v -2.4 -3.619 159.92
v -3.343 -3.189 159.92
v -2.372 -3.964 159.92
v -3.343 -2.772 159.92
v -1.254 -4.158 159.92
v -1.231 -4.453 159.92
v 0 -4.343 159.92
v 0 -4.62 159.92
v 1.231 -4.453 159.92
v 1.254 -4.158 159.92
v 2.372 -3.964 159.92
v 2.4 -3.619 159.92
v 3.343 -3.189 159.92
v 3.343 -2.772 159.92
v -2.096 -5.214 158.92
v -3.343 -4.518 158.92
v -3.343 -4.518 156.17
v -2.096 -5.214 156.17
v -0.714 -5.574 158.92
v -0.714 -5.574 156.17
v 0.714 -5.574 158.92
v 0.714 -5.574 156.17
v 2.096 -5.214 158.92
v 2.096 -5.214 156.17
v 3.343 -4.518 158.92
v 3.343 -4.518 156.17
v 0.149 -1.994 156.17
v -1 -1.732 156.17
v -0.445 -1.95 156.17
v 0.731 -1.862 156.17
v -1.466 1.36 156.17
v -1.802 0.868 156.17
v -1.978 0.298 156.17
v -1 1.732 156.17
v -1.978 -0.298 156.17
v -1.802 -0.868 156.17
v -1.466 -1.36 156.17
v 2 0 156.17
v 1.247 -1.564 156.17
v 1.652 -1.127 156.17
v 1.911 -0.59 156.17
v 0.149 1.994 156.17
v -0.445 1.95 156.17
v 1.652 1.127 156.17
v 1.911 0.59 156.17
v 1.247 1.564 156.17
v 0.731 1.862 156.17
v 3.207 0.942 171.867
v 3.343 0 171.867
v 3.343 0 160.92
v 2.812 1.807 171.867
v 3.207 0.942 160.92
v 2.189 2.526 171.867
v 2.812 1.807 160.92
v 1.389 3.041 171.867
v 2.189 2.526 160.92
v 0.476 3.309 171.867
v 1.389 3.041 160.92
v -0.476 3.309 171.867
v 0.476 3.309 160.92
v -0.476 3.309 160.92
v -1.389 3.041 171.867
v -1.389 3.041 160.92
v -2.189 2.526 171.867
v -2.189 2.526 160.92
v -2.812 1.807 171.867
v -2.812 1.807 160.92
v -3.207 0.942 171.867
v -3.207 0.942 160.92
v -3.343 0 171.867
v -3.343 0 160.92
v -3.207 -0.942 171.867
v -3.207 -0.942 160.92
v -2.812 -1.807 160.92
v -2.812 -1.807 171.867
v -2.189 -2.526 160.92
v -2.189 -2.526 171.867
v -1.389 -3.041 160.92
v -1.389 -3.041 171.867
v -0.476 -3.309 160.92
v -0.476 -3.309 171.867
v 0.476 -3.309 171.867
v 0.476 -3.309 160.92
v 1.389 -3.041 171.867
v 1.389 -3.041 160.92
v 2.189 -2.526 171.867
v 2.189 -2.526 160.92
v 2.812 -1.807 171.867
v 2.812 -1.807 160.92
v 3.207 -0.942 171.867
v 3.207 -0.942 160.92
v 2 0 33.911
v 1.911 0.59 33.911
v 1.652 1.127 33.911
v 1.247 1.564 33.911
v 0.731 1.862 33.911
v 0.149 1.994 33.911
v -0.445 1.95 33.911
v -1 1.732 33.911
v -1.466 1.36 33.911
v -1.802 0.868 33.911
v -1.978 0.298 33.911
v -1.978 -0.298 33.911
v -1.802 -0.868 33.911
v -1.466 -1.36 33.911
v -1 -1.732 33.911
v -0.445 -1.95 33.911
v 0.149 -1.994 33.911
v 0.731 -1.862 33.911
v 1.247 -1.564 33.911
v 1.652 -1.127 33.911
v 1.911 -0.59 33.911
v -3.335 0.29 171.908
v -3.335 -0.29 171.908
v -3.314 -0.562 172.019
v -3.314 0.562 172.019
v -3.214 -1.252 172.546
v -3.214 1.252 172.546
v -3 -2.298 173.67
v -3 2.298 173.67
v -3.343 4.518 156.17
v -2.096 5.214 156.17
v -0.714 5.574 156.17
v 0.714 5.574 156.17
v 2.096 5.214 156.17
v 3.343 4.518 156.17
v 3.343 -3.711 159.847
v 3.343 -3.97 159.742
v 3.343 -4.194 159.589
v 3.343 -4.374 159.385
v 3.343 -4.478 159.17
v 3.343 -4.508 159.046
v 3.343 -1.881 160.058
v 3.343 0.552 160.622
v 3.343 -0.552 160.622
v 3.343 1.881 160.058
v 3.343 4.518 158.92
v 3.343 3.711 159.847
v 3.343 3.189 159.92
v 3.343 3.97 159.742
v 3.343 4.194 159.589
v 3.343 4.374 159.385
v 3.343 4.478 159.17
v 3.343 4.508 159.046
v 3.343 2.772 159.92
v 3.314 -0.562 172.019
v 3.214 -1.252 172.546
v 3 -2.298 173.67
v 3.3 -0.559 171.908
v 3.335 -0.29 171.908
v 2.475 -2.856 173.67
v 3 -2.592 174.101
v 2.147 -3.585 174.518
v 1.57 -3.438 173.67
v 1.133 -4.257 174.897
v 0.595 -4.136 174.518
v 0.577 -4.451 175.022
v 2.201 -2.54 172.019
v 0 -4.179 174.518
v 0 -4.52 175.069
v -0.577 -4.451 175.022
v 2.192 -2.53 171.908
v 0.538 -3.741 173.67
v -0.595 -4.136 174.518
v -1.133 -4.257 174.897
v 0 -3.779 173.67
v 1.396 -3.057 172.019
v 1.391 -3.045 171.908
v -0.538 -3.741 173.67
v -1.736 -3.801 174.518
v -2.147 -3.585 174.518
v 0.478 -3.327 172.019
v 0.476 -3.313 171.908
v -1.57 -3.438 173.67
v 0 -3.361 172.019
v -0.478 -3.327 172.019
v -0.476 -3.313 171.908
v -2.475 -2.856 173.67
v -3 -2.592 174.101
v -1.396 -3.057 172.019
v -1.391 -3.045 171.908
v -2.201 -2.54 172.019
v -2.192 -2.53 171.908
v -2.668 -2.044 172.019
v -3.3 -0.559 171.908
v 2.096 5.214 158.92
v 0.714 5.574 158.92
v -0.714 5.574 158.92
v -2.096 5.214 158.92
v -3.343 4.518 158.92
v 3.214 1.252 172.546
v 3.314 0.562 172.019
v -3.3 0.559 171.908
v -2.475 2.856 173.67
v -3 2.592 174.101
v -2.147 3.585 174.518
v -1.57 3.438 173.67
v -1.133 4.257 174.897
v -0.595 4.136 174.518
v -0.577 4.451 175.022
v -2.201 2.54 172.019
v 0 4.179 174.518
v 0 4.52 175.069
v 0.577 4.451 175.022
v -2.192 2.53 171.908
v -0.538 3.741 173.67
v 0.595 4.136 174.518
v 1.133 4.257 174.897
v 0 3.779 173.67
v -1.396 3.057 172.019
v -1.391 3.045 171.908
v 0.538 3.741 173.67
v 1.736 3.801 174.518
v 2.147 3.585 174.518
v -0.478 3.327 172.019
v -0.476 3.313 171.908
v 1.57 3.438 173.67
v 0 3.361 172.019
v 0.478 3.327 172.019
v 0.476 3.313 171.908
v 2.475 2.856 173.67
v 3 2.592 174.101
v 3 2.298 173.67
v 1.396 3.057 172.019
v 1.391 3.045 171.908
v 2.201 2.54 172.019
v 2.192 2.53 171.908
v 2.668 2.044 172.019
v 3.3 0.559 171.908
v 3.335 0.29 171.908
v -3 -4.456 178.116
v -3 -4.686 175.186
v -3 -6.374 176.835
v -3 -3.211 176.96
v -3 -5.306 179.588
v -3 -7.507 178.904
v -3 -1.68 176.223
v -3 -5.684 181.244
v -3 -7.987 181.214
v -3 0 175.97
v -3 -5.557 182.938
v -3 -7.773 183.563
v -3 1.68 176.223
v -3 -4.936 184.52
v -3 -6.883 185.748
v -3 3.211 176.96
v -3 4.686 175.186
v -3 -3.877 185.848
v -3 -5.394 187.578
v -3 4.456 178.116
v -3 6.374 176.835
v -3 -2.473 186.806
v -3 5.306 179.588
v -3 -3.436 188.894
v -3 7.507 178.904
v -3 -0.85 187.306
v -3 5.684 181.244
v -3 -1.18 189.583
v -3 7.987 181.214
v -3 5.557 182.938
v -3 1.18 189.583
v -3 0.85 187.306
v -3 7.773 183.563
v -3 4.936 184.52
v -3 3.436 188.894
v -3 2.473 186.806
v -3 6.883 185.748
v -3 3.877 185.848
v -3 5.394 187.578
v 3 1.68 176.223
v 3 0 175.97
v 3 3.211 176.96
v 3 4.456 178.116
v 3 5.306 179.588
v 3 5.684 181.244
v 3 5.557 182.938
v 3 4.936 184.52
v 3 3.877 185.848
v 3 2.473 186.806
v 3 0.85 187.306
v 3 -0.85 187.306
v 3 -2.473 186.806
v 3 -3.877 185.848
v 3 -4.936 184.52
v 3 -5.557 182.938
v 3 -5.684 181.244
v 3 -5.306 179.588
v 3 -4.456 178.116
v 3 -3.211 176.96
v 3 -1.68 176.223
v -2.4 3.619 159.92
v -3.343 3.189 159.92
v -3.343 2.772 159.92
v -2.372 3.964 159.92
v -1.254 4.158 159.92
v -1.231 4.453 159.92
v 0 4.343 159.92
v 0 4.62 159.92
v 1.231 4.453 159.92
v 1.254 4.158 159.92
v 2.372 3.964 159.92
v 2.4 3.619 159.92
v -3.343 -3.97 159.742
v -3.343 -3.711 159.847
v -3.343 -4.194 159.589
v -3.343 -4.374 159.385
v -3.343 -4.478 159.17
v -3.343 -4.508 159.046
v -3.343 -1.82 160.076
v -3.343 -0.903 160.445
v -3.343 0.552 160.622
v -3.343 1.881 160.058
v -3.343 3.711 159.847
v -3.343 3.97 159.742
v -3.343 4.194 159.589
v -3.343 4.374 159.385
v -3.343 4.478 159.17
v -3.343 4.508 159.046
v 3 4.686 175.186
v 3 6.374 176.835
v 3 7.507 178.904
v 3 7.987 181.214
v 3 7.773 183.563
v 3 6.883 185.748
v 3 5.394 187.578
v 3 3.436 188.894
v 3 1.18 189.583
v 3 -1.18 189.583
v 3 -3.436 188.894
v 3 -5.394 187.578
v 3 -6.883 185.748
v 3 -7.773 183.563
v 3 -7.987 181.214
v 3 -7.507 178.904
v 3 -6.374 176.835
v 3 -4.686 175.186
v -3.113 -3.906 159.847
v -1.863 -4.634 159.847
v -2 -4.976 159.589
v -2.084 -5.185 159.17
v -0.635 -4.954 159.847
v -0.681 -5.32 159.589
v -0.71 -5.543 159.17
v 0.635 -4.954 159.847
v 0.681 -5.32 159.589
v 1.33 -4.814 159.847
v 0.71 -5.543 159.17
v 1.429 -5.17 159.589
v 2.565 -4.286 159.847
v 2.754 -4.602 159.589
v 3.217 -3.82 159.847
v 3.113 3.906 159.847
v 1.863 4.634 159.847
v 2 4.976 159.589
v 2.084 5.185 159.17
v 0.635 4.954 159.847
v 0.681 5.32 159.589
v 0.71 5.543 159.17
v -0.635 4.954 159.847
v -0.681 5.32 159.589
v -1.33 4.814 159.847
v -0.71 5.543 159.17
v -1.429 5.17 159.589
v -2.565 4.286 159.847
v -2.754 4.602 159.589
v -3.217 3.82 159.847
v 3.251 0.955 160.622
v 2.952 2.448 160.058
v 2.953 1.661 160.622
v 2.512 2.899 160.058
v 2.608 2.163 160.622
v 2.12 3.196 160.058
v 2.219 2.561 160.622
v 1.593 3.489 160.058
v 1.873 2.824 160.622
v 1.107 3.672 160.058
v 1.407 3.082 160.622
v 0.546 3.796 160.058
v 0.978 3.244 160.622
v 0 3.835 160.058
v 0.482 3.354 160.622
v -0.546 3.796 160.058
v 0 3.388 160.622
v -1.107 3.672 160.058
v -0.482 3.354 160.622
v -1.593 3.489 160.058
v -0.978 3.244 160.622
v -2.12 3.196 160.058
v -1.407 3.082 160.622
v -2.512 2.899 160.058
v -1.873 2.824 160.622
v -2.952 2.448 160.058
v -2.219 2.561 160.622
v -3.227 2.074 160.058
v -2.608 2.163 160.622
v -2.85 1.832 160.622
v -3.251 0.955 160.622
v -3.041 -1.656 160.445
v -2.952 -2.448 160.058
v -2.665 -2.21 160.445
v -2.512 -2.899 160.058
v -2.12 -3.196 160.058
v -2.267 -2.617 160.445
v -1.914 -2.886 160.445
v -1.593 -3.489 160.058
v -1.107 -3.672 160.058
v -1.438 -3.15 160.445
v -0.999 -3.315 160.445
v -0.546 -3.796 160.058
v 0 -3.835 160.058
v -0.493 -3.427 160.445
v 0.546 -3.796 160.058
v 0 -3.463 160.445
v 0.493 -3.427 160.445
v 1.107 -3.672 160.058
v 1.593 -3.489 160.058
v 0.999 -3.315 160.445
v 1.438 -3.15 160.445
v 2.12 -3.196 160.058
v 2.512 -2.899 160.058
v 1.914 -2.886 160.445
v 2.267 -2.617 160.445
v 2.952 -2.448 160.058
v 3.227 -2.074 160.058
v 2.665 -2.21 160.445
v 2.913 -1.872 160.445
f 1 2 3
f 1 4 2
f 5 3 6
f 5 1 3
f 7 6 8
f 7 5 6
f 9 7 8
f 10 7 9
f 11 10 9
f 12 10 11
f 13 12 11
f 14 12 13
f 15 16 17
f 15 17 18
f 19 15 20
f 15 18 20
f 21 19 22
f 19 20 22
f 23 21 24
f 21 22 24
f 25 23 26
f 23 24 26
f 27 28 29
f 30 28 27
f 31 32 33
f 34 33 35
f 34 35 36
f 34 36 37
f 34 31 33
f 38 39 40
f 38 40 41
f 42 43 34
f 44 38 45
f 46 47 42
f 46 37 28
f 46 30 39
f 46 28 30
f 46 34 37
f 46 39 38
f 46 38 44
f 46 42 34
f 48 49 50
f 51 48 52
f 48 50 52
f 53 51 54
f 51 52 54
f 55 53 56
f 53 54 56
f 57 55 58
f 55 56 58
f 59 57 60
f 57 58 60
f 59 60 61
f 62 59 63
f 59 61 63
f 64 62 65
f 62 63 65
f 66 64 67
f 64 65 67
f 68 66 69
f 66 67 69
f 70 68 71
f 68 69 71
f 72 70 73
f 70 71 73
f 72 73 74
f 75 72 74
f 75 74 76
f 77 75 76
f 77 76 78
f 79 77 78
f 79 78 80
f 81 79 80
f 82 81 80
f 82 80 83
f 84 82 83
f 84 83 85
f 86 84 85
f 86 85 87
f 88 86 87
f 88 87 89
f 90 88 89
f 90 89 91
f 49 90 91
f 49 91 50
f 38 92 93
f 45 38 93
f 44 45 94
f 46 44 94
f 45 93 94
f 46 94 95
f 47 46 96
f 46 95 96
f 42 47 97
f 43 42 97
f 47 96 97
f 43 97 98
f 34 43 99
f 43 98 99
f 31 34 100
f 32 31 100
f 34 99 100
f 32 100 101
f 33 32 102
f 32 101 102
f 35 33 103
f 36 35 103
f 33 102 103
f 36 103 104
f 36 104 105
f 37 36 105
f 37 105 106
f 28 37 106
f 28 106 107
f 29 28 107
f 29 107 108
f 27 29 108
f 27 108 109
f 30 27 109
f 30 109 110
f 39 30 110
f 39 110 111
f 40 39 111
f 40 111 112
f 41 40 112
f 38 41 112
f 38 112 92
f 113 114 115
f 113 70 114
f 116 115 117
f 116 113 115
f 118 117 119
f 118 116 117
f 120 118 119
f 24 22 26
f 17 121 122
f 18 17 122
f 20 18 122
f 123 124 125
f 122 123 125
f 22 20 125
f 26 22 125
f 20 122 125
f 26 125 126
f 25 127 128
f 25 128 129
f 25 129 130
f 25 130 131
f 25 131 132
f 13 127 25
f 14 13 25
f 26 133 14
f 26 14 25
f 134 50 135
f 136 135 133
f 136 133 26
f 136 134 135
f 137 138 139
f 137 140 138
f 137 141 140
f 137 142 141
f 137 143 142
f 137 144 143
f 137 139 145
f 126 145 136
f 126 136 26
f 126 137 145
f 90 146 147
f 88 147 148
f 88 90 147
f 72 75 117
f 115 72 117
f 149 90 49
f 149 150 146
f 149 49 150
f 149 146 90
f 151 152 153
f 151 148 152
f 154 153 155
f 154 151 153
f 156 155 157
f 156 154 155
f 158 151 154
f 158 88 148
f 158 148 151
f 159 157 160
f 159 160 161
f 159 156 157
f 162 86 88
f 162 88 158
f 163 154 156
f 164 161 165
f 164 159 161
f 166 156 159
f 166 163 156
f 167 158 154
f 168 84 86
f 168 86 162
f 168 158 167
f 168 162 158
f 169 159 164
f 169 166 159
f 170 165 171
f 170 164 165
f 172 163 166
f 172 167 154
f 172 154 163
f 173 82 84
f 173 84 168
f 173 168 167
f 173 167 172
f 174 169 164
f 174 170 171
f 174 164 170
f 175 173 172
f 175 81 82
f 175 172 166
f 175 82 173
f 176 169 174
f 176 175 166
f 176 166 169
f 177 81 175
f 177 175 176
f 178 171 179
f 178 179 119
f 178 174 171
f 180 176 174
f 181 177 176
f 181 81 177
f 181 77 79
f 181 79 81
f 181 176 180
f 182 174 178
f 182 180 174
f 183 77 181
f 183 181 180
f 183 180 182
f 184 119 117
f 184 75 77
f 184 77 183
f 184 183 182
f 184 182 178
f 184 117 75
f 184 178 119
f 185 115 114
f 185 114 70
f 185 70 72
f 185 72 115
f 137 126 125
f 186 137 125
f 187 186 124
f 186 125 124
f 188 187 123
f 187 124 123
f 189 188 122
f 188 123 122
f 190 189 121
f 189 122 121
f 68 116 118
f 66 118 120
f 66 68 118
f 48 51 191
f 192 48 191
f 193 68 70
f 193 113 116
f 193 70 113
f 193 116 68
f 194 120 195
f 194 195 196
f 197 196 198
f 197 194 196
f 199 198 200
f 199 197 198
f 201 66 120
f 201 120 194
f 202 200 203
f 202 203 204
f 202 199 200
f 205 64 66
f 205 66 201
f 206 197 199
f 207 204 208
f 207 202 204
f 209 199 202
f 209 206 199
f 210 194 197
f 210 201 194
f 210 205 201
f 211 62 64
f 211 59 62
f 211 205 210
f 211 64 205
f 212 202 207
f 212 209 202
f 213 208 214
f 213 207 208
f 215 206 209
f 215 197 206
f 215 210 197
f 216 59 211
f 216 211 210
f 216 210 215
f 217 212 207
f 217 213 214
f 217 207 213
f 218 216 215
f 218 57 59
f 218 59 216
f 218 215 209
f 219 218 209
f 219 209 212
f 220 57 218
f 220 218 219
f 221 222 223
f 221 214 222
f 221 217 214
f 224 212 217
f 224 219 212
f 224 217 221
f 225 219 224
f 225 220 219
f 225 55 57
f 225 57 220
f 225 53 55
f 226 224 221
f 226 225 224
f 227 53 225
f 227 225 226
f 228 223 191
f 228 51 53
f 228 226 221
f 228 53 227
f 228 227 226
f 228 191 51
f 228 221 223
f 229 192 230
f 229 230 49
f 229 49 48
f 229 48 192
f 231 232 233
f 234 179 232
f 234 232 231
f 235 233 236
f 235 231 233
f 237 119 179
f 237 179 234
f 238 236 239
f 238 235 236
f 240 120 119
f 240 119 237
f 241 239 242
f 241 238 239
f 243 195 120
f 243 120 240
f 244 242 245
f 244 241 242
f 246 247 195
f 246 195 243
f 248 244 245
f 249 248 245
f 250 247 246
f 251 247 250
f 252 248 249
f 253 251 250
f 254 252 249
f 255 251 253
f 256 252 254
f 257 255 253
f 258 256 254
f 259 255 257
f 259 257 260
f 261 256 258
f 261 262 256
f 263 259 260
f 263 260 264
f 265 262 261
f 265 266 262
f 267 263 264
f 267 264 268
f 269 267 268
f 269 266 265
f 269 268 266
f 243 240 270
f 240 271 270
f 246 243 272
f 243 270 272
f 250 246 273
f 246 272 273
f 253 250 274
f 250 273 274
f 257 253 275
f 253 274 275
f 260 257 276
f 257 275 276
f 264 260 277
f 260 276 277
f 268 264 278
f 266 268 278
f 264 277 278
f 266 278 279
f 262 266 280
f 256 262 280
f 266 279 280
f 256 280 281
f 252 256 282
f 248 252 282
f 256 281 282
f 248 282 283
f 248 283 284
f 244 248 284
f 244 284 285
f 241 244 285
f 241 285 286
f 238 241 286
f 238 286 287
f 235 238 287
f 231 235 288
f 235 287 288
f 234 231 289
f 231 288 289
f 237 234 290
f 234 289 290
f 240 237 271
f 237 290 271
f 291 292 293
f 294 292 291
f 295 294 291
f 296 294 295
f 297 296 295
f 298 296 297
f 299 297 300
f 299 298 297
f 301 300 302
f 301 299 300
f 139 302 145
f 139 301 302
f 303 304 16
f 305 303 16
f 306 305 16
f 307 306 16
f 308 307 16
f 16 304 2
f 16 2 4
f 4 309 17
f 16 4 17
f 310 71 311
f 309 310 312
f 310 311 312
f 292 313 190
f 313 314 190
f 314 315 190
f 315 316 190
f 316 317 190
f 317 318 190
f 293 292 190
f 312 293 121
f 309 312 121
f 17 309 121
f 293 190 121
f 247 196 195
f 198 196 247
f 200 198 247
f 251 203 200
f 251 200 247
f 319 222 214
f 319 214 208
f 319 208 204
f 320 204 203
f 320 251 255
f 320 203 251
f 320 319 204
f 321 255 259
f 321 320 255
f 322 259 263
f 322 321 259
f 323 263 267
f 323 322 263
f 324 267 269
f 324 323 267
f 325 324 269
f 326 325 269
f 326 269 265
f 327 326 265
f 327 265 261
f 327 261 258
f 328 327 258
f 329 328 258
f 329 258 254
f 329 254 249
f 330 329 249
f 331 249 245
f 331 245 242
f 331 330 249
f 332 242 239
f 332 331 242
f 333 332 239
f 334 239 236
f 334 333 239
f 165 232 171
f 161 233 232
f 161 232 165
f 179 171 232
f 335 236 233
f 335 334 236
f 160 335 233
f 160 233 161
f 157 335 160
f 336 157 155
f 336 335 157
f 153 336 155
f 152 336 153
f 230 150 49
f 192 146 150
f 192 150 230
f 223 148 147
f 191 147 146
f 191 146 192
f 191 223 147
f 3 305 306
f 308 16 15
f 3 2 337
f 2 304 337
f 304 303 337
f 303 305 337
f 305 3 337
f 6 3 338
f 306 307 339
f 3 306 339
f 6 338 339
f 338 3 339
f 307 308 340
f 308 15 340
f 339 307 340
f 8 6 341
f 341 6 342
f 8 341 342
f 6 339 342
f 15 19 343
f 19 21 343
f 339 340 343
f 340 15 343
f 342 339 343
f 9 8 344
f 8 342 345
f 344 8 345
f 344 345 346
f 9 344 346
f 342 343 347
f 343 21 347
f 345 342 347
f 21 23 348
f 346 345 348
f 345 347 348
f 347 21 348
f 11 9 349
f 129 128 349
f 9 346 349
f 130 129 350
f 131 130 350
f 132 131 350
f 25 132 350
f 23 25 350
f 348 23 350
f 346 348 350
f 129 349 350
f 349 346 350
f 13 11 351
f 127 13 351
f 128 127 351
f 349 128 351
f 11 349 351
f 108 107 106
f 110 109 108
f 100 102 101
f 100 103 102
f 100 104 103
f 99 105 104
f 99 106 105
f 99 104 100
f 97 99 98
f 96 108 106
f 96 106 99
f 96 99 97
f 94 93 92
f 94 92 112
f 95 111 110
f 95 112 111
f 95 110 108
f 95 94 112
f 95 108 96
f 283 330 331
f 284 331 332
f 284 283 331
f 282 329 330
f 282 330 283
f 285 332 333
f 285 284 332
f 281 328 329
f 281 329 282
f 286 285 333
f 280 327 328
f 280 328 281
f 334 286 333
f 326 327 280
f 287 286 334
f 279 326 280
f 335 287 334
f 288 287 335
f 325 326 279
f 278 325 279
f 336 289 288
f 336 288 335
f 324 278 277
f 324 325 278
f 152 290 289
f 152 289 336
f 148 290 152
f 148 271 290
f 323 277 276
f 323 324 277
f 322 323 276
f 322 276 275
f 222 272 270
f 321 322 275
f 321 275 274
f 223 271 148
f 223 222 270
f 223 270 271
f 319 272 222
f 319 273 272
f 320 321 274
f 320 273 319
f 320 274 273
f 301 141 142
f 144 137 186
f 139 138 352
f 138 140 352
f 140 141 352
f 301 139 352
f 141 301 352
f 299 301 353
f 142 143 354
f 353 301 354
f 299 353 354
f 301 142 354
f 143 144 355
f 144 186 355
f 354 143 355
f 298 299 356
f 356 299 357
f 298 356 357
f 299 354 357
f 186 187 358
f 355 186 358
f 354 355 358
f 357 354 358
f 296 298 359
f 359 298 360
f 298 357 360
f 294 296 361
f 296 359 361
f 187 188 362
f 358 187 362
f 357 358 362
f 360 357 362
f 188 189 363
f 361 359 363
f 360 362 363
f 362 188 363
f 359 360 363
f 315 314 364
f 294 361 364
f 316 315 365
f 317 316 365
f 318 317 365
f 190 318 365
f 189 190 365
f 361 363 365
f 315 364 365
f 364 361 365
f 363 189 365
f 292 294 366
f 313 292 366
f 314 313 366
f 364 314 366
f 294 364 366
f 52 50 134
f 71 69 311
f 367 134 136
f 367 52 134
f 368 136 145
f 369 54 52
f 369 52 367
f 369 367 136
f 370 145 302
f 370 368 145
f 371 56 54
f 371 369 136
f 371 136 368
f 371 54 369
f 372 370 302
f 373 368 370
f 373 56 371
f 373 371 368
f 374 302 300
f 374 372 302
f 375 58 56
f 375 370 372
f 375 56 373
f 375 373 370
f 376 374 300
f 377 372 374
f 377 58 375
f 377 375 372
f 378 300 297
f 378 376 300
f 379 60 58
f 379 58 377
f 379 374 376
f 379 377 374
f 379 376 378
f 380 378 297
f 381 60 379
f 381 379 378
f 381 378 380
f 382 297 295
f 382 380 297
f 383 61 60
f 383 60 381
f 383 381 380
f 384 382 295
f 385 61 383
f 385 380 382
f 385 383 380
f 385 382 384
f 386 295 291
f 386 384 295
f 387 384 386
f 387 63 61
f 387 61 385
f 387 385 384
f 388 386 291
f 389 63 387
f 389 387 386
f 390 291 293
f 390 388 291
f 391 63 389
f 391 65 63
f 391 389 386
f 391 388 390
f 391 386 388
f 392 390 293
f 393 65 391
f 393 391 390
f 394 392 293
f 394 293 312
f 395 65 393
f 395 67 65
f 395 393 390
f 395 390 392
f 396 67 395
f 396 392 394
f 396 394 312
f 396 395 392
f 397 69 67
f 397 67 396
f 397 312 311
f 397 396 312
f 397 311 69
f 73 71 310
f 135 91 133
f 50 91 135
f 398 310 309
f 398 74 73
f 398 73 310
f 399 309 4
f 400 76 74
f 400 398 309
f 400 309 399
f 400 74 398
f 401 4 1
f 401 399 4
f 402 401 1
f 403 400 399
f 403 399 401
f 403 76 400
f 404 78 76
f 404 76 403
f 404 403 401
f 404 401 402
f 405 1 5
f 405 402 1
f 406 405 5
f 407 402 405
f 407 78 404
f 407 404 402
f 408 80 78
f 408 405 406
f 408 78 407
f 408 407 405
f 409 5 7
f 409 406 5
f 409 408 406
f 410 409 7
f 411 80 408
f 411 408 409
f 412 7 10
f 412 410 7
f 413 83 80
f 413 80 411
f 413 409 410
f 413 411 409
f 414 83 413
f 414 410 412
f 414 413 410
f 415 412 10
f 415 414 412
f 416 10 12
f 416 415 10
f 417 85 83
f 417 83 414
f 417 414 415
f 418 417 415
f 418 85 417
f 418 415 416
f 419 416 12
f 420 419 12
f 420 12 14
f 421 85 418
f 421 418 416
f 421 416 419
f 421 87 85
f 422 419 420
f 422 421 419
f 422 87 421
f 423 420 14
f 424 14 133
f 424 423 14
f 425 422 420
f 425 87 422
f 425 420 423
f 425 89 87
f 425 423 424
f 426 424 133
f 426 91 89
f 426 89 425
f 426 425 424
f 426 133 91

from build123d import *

# Parameters (mm, degrees)
SKETCH1_R                = 2
BOSS_EXTRUDE1_DEPTH      = 156.17
SKETCH2_R                = 5.62
BOSS_EXTRUDE2_DEPTH      = 3.75
SKETCH3_R                = 3.342777959
BOSS_EXTRUDE3_DEPTH      = 14.75
FILLET4_R                = 1
FILLET5_R                = 1
SKETCH4_R                = 8
SKETCH4_R_2              = 5.7
BOSS_EXTRUDE4_DEPTH      = 5
BOSS_EXTRUDE4_DEPTH_BACK = 5
SKETCH7_W                = 5.315591211
SKETCH7_H                = 6.235782502
CUT_EXTRUDE2_DEPTH       = 190.921808488
CUT_EXTRUDE2_DEPTH_BACK  = 190.921808488
SKETCH8_W                = 43.943045651
SKETCH8_H                = 13.288257187
CUT_EXTRUDE3_DEPTH       = 190.868067628
CUT_EXTRUDE3_DEPTH_BACK  = 190.868067628


with BuildPart() as part:
    # Sketch1 → Boss-Extrude1 (new body)
    with BuildSketch(Plane.XY):
        Circle(SKETCH1_R)
    extrude(amount=BOSS_EXTRUDE1_DEPTH)

    # Sketch8 → Cut-Extrude3 (cut, two sides)
    with BuildSketch(Plane(origin=(0, 0, 0), x_dir=(0, 0, -1), z_dir=(1, 0, 0))) as cut_extrude3_sk:
        with Locations((-11.938978735, -2.807349683)):
            Rectangle(SKETCH8_W, SKETCH8_H)
    extrude(amount=CUT_EXTRUDE3_DEPTH, mode=Mode.SUBTRACT)
    extrude(cut_extrude3_sk.sketch, amount=-CUT_EXTRUDE3_DEPTH_BACK, mode=Mode.SUBTRACT)


with BuildPart() as body_2:
    # Sketch2 → Boss-Extrude2 (new body)
    with BuildSketch(Plane.XY.offset(156.17)):
        Circle(SKETCH2_R)
    extrude(amount=BOSS_EXTRUDE2_DEPTH)

    # Sketch3 → Boss-Extrude3 (add)
    with BuildSketch(Plane.XY.offset(159.92)):
        Circle(SKETCH3_R)
    extrude(amount=BOSS_EXTRUDE3_DEPTH)

    # Fillet4
    fillet4_edges = [body_2.edges().sort_by_distance(p)[0] for p in [
        (-3.342777959, 0, 159.92),
    ]]
    fillet(fillet4_edges, radius=FILLET4_R)

    # Fillet5
    fillet5_edges = [body_2.edges().sort_by_distance(p)[0] for p in [
        (-5.62, 0, 159.92),
    ]]
    fillet(fillet5_edges, radius=FILLET5_R)

    # Sketch4 → Boss-Extrude4 (add, two sides)
    with BuildSketch(Plane(origin=(0, 0, 0), x_dir=(0, 0, -1), z_dir=(1, 0, 0))) as boss_extrude4_sk:
        with Locations((-181.67, 0)):
            Circle(SKETCH4_R)
        with Locations((-181.67, 0)):
            Circle(SKETCH4_R_2, mode=Mode.SUBTRACT)
    extrude(amount=BOSS_EXTRUDE4_DEPTH)
    extrude(boss_extrude4_sk.sketch, amount=-BOSS_EXTRUDE4_DEPTH_BACK)


with BuildPart() as body_3:
    # Sketch4_4 → Revolve2 (revolve)
    with BuildSketch(Plane(origin=(0, 0, 0), x_dir=(0, 0, -1), z_dir=(1, 0, 0))):
        with BuildLine():
            Line((-171.86665682, 0), (-173.67, 0))
            ThreePointArc((-173.67, 0), (-174.027795759, -2.365737588), (-175.069178584, -4.519862457))
            add(Edge.make_bspline(
                [(-175.069178584, -4.519862457), (-173.629685325, -3.535053024), (-171.86665682, -3.342777959)],
                knots=[0, 0, 0, 1, 1, 1], degree=2))
            Line((-171.86665682, -3.342777959), (-171.86665682, 0))
        make_face()
    revolve(axis=Axis((0, 0, 189.67), (0, 0, -1)))


with BuildPart() as cut_extrude2_tool:
    # Sketch7 → Cut-Extrude2 (new, two sides)
    with BuildSketch(Plane(origin=(0, 0, 0), x_dir=(1, 0, 0), z_dir=(0, 1, 0))) as cut_extrude2_sk:
        Polygon((3, -173.67), (3.34277796, -171.86665682), (8.65836917, -171.86665682), (8.65836917, -190.916502477), (3, -190.916502477), align=None)
        Polygon((-3, -190.916502477), (-8.65836917, -190.916502477), (-8.65836917, -171.86665682), (-3.34277796, -171.86665682), (-3, -173.67), align=None)
        with Locations((-6.000573564, -157.802108749)):
            Rectangle(SKETCH7_W, SKETCH7_H)
        with Locations((6.000573564, -157.802108749)):
            Rectangle(SKETCH7_W, SKETCH7_H)
    extrude(amount=CUT_EXTRUDE2_DEPTH)
    extrude(cut_extrude2_sk.sketch, amount=-CUT_EXTRUDE2_DEPTH_BACK)


with BuildPart() as body_2_1:
    add(body_2.part)

    # Cut-Extrude2: cut by cut_extrude2_tool
    add(cut_extrude2_tool.part, mode=Mode.SUBTRACT)


with BuildPart() as body_3_1:
    add(body_3.part)

    # Cut-Extrude2: cut by cut_extrude2_tool
    add(cut_extrude2_tool.part, mode=Mode.SUBTRACT)


with BuildPart() as body_2_2:
    add(body_2_1.part)

    # Combine1: union body 3
    add(body_3_1.part)


solid = Compound([part.part, body_2_2.part])
